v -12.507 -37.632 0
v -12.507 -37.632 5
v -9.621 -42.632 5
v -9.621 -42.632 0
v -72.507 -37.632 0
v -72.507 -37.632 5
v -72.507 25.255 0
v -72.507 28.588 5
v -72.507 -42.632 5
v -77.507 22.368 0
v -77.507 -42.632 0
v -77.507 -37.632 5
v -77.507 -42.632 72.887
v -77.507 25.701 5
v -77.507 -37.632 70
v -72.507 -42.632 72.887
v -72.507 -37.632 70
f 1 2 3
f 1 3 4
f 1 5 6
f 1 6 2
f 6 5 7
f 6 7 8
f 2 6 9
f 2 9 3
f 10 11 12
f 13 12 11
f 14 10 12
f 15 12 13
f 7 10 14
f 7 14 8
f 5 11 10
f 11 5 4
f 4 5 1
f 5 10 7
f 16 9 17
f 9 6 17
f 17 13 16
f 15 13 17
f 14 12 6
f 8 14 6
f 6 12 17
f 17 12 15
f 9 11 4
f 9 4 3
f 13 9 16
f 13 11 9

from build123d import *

# Parameters (mm, degrees)
SKETCH1_W           = 5
SKETCH1_H           = 65
BOSS_EXTRUDE1_DEPTH = 5
SKETCH2_W           = 65
SKETCH2_H           = 5
BOSS_EXTRUDE3_DEPTH = 5
SKETCH4_W           = 65
SKETCH4_H           = 5
BOSS_EXTRUDE4_DEPTH = 5
DRAFT3_ANGLE        = 30
DRAFT7_ANGLE        = 30
DRAFT8_ANGLE        = 30
DRAFT9_ANGLE        = 30


with BuildPart() as part:
    # Sketch1 → Boss-Extrude1 (new body)
    with BuildSketch(Plane.XY):
        with Locations((-75.007440829, -10.132080835)):
            Rectangle(SKETCH1_W, SKETCH1_H)
    extrude(amount=BOSS_EXTRUDE1_DEPTH)

    # Sketch2 → Boss-Extrude3 (add)
    with BuildSketch(Plane.ZY.offset(77.507440829)):
        with Locations((37.5, -40.132080835)):
            Rectangle(SKETCH2_W, SKETCH2_H)
    extrude(amount=-BOSS_EXTRUDE3_DEPTH)

    # Sketch4 → Boss-Extrude4 (add)
    with BuildSketch(Plane(origin=(0, -37.632080835, 0), x_dir=(1, 0, 0), z_dir=(0, 1, 0))):
        with Locations((-45.007440829, -2.5)):
            Rectangle(SKETCH4_W, SKETCH4_H)
    extrude(amount=-BOSS_EXTRUDE4_DEPTH)

    # Draft3
    draft3_faces = [part.faces().sort_by_distance(p)[0] for p in [
        (-12.507440829, -40.132080835, 2.5),
    ]]
    draft(draft3_faces, Plane.ZX.offset(-37.632080835), DRAFT3_ANGLE)

    # Draft7
    draft7_faces = [part.faces().sort_by_distance(p)[0] for p in [
        (-75.007440829, -40.132080835, 70),
    ]]
    draft(draft7_faces, Plane(origin=(-72.507440829, -37.632080835, 5), x_dir=(0, 0, 1), z_dir=(0, 1, 0)), DRAFT7_ANGLE)

    # Draft8
    draft8_faces = [part.faces().sort_by_distance(p)[0] for p in [
        (-75.007440829, 22.367919165, 2.5),
    ]]
    draft(draft8_faces, Plane(origin=(-77.507440829, 22.367919165, 5), x_dir=(0, 0, -1), z_dir=(-1, 0, 0)), DRAFT8_ANGLE)

    # Draft9
    draft9_faces = [part.faces().sort_by_distance(p)[0] for p in [
        (-75.007440829, 23.811294838, 2.5),
    ]]
    draft(draft9_faces, Plane(origin=(0, 0, 0), x_dir=(-1, 0, 0), z_dir=(0, 0, -1)), DRAFT9_ANGLE)


solid = part.part
